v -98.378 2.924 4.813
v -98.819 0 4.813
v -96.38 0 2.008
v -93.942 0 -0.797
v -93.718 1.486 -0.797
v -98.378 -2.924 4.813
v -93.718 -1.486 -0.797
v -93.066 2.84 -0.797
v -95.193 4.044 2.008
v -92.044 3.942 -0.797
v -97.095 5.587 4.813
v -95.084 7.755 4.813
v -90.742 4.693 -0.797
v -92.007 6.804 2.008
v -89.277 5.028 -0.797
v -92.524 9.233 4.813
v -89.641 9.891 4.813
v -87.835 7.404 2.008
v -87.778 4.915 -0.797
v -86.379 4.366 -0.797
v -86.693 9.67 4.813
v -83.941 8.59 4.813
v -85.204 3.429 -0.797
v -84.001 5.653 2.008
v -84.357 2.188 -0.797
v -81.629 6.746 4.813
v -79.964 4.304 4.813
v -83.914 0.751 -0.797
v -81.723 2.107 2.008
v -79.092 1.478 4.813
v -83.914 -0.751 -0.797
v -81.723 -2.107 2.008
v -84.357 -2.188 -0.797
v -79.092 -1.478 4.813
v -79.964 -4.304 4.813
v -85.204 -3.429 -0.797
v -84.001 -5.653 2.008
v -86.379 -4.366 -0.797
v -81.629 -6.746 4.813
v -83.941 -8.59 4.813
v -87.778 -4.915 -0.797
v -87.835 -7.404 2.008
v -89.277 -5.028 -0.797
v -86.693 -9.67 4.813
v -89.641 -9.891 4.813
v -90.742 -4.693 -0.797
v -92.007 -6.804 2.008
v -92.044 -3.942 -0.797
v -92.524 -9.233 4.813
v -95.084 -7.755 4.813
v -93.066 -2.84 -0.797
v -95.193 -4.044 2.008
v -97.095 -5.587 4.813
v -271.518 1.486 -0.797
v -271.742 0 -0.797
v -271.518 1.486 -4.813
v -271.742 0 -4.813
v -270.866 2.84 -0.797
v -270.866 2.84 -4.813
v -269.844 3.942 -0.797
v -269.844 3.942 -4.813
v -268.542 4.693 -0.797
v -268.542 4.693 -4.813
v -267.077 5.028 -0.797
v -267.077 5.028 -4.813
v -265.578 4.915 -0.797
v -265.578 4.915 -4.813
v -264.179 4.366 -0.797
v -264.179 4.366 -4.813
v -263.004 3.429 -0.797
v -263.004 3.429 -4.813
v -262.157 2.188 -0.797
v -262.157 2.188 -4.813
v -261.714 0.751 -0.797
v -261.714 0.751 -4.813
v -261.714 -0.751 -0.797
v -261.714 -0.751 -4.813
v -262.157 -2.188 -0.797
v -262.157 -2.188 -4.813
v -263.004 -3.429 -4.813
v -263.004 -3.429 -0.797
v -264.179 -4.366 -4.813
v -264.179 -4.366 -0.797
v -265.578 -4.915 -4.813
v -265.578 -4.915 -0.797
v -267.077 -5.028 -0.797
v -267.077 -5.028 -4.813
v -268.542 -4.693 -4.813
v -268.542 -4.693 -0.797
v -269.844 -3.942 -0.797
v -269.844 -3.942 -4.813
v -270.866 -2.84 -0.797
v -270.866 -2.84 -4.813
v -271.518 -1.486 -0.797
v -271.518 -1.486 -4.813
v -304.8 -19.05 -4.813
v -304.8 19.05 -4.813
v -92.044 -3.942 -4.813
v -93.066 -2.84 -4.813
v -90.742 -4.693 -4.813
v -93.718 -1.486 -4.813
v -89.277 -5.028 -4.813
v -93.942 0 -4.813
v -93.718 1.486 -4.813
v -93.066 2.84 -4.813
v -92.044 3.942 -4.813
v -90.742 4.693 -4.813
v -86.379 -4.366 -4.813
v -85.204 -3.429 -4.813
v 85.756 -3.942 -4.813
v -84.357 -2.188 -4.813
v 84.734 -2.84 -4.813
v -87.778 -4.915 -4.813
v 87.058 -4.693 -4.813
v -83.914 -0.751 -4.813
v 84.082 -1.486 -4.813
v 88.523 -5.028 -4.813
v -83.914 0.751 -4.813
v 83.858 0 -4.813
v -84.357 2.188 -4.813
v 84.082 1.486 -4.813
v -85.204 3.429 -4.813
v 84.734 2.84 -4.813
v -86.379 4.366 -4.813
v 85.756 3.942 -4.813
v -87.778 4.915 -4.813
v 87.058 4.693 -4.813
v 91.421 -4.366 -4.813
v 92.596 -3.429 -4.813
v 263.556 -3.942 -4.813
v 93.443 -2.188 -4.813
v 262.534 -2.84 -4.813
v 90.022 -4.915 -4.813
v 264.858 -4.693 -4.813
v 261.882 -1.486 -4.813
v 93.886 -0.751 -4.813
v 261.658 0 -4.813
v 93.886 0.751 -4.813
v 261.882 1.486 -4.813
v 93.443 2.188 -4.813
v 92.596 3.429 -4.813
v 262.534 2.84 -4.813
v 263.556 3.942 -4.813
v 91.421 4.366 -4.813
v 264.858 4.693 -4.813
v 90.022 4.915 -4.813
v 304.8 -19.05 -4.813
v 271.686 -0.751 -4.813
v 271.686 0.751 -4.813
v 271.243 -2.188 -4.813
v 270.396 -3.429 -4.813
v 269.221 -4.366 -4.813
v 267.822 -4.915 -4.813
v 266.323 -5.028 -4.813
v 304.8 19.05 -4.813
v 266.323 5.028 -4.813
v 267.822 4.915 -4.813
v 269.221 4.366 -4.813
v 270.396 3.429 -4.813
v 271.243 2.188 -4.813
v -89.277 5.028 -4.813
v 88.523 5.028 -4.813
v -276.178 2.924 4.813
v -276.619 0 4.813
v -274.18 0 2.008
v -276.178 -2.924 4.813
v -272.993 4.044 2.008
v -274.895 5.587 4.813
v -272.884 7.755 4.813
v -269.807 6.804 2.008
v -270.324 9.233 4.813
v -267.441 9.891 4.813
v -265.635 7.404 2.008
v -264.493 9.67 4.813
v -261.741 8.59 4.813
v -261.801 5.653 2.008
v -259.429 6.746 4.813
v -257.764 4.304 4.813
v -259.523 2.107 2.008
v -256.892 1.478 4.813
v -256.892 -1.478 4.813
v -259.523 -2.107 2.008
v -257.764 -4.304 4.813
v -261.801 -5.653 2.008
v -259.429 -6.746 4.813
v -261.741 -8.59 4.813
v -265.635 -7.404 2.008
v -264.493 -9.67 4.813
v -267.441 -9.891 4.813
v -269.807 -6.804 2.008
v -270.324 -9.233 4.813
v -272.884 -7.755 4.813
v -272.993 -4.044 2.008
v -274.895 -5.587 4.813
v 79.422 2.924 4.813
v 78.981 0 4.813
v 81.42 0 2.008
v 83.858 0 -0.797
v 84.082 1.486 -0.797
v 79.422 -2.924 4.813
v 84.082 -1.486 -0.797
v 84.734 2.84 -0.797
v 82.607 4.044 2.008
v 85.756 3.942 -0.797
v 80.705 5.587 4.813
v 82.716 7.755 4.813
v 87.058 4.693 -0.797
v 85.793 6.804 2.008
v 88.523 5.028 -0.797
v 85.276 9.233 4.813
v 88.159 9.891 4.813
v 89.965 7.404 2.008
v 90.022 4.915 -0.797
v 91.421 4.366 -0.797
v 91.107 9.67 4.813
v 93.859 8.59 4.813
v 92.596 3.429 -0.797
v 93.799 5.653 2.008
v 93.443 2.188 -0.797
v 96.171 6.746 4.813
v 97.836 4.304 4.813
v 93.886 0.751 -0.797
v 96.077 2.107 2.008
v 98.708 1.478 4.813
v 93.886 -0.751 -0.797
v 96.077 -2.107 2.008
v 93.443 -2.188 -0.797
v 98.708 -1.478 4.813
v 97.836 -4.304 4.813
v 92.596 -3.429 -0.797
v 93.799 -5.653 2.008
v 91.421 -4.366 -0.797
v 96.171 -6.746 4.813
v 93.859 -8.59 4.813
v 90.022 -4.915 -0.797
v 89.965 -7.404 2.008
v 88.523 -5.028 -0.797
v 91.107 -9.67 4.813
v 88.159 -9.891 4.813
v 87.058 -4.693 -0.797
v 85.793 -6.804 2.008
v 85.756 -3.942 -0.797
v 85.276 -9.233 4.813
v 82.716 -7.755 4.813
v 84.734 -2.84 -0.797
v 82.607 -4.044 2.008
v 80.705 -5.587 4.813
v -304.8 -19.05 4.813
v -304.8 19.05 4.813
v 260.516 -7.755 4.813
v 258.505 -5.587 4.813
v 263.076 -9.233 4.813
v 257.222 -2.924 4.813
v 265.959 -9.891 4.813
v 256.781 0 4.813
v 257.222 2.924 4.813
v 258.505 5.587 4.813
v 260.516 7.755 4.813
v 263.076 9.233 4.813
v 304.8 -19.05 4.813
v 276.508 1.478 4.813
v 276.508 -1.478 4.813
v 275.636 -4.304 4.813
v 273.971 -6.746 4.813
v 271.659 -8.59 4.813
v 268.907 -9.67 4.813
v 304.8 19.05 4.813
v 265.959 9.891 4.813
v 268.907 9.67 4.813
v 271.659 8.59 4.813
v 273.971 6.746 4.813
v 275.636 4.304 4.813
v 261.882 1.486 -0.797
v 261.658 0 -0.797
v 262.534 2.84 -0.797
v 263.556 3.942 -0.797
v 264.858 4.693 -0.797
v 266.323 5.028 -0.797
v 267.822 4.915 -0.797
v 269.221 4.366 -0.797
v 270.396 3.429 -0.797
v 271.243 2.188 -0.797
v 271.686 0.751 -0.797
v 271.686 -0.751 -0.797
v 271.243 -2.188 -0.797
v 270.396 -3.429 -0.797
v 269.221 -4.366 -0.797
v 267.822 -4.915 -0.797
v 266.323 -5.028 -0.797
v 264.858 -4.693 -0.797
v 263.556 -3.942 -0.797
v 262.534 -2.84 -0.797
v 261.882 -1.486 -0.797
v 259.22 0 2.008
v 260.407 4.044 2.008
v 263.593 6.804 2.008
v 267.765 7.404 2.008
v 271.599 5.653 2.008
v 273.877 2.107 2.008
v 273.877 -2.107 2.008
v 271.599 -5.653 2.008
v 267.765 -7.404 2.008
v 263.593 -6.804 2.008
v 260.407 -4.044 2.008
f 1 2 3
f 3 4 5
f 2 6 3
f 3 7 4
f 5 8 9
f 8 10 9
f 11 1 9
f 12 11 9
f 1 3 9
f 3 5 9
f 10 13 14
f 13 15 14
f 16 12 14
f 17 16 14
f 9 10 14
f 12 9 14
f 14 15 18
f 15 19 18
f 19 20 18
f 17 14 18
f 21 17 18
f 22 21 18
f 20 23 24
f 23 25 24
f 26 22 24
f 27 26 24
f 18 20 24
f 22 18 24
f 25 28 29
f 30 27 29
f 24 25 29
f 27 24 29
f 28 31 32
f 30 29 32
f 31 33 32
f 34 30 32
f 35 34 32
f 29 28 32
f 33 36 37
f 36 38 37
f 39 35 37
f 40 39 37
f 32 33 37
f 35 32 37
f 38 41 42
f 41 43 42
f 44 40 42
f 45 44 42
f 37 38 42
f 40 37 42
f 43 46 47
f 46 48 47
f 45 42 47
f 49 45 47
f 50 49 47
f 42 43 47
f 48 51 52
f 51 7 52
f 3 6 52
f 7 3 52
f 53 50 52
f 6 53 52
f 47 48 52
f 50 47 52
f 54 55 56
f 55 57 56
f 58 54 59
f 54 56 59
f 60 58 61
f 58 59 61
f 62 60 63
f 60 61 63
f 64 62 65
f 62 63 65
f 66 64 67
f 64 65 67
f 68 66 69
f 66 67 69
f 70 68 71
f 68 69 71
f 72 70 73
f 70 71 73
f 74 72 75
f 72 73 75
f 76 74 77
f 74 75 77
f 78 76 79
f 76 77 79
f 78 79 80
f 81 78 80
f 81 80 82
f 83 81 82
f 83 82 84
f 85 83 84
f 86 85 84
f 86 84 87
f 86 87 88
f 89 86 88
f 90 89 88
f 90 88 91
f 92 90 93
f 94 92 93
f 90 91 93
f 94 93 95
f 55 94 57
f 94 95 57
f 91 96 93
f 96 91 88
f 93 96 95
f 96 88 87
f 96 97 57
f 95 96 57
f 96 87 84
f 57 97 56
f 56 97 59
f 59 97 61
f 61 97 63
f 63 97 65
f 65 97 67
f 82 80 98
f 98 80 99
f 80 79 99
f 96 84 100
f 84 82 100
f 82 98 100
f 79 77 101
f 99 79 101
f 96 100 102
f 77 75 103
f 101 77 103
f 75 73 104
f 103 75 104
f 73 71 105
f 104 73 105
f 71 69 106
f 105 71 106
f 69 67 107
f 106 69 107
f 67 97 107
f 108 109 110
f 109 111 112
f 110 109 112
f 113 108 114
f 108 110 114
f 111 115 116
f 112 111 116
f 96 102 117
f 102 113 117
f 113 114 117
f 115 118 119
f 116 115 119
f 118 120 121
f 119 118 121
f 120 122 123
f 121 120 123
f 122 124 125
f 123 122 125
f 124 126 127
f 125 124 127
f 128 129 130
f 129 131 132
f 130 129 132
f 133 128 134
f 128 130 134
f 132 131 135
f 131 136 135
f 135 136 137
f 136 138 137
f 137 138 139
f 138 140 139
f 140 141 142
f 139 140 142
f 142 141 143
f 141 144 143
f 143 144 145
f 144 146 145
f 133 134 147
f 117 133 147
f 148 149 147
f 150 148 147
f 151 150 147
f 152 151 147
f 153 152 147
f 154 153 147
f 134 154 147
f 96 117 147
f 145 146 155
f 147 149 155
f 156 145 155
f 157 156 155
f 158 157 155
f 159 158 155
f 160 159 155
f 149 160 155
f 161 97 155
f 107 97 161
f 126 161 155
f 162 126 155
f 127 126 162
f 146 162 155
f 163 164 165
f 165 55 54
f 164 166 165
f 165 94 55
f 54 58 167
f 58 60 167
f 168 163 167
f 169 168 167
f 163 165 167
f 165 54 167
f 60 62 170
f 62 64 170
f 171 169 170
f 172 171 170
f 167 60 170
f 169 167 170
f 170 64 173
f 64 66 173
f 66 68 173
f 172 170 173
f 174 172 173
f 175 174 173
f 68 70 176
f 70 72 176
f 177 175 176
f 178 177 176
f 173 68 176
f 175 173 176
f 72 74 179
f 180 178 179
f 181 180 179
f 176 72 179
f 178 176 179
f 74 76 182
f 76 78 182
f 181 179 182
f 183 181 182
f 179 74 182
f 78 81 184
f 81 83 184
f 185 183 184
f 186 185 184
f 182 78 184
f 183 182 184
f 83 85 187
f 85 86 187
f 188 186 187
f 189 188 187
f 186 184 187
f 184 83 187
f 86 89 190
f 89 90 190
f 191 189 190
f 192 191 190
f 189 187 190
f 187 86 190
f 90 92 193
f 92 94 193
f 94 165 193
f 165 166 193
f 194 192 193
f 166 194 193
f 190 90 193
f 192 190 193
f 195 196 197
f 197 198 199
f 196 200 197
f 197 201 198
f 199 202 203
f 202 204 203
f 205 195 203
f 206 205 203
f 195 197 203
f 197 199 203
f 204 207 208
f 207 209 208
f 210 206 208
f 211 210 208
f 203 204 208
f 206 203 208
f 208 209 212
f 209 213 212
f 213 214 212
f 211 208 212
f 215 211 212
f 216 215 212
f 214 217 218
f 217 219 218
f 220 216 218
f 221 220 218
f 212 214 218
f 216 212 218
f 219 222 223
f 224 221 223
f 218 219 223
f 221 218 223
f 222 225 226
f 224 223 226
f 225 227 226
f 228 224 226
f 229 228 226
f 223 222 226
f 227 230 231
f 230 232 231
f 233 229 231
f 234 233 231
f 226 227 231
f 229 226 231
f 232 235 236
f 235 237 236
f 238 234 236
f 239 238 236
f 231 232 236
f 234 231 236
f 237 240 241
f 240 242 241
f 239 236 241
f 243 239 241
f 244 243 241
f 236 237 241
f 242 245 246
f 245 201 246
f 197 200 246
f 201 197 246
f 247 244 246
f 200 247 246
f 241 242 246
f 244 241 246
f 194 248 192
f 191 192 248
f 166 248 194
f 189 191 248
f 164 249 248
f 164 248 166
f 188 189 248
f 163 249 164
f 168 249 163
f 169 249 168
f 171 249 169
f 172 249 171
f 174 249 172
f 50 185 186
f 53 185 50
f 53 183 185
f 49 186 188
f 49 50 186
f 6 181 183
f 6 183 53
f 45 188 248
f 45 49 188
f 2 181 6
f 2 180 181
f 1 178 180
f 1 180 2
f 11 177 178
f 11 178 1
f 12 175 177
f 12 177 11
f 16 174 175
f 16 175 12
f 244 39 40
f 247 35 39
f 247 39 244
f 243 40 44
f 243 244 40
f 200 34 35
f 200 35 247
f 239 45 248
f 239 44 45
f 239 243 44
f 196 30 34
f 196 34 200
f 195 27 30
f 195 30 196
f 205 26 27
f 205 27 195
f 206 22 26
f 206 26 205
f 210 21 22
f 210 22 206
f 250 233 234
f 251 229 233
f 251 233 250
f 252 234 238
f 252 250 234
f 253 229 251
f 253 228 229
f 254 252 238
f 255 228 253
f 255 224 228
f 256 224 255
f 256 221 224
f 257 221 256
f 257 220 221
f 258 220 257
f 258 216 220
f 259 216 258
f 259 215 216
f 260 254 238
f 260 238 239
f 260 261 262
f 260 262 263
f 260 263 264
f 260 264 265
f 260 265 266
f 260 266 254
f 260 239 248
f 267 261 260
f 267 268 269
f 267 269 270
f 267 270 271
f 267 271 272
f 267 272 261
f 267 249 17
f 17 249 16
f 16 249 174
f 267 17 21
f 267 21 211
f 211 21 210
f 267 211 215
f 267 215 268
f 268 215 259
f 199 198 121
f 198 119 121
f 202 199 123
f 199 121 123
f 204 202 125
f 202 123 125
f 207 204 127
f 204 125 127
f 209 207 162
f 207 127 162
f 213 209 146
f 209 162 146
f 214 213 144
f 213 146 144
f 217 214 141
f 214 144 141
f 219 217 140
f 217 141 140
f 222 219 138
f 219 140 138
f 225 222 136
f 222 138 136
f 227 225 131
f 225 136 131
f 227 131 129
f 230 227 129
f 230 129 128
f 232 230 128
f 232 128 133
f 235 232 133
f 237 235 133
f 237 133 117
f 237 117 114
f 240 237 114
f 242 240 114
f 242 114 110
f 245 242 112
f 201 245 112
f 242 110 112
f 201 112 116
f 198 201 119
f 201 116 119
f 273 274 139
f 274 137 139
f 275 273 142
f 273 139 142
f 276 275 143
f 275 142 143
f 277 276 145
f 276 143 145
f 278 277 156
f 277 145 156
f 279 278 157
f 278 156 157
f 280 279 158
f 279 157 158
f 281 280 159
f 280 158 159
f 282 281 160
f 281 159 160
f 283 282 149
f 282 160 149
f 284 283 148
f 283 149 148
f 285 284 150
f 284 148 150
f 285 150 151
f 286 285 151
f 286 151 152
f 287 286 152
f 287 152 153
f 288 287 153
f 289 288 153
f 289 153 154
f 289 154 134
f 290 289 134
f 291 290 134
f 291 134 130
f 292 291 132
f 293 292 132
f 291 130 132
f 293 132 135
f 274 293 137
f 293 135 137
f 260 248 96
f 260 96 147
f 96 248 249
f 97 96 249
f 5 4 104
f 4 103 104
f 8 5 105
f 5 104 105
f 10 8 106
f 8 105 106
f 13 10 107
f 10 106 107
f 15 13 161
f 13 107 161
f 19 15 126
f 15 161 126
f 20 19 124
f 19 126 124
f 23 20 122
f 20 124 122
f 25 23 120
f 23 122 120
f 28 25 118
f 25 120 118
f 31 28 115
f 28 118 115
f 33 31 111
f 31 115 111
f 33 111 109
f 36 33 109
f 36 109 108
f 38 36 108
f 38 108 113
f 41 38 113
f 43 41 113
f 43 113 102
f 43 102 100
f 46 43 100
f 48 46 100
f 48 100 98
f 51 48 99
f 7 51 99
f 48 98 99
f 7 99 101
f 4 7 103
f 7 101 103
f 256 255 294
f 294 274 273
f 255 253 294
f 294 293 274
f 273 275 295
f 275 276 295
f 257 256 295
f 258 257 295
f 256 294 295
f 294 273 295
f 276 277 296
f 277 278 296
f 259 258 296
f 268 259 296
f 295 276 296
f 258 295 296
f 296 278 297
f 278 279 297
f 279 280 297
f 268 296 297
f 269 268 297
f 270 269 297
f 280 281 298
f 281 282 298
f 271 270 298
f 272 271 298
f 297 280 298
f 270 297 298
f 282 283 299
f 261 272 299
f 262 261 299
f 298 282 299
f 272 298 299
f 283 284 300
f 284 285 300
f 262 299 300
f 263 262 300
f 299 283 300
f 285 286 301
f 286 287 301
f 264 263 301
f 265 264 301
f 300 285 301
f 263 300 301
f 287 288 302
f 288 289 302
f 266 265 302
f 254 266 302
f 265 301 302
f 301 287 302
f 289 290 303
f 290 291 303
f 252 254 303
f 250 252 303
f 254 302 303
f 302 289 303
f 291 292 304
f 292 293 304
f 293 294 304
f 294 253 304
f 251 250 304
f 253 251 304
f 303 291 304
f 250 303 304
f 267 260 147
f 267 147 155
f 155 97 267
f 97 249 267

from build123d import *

# Parameters (mm, degrees)
F0_W           = 609.6
F0_H           = 38.1
F1_DEPTH       = 4.8133
F3_D           = 10.0838
F3_CSINK_D     = 19.8374
F3_CSINK_ANGLE = 82


with BuildPart() as f1:
    # F0 (on Top) → F1 (new body, symmetric)
    with BuildSketch(Plane.XY):
        Rectangle(F0_W, F0_H)
    extrude(amount=F1_DEPTH, both=True)

    # F3 (through all)
    with Locations(Plane.XY.offset(4.8133)):
        with Locations((-266.7, 0), (-88.9, 0), (88.9, 0), (266.7, 0)):
            CounterSinkHole(F3_D / 2, F3_CSINK_D / 2, counter_sink_angle=F3_CSINK_ANGLE)


solid = f1.part
